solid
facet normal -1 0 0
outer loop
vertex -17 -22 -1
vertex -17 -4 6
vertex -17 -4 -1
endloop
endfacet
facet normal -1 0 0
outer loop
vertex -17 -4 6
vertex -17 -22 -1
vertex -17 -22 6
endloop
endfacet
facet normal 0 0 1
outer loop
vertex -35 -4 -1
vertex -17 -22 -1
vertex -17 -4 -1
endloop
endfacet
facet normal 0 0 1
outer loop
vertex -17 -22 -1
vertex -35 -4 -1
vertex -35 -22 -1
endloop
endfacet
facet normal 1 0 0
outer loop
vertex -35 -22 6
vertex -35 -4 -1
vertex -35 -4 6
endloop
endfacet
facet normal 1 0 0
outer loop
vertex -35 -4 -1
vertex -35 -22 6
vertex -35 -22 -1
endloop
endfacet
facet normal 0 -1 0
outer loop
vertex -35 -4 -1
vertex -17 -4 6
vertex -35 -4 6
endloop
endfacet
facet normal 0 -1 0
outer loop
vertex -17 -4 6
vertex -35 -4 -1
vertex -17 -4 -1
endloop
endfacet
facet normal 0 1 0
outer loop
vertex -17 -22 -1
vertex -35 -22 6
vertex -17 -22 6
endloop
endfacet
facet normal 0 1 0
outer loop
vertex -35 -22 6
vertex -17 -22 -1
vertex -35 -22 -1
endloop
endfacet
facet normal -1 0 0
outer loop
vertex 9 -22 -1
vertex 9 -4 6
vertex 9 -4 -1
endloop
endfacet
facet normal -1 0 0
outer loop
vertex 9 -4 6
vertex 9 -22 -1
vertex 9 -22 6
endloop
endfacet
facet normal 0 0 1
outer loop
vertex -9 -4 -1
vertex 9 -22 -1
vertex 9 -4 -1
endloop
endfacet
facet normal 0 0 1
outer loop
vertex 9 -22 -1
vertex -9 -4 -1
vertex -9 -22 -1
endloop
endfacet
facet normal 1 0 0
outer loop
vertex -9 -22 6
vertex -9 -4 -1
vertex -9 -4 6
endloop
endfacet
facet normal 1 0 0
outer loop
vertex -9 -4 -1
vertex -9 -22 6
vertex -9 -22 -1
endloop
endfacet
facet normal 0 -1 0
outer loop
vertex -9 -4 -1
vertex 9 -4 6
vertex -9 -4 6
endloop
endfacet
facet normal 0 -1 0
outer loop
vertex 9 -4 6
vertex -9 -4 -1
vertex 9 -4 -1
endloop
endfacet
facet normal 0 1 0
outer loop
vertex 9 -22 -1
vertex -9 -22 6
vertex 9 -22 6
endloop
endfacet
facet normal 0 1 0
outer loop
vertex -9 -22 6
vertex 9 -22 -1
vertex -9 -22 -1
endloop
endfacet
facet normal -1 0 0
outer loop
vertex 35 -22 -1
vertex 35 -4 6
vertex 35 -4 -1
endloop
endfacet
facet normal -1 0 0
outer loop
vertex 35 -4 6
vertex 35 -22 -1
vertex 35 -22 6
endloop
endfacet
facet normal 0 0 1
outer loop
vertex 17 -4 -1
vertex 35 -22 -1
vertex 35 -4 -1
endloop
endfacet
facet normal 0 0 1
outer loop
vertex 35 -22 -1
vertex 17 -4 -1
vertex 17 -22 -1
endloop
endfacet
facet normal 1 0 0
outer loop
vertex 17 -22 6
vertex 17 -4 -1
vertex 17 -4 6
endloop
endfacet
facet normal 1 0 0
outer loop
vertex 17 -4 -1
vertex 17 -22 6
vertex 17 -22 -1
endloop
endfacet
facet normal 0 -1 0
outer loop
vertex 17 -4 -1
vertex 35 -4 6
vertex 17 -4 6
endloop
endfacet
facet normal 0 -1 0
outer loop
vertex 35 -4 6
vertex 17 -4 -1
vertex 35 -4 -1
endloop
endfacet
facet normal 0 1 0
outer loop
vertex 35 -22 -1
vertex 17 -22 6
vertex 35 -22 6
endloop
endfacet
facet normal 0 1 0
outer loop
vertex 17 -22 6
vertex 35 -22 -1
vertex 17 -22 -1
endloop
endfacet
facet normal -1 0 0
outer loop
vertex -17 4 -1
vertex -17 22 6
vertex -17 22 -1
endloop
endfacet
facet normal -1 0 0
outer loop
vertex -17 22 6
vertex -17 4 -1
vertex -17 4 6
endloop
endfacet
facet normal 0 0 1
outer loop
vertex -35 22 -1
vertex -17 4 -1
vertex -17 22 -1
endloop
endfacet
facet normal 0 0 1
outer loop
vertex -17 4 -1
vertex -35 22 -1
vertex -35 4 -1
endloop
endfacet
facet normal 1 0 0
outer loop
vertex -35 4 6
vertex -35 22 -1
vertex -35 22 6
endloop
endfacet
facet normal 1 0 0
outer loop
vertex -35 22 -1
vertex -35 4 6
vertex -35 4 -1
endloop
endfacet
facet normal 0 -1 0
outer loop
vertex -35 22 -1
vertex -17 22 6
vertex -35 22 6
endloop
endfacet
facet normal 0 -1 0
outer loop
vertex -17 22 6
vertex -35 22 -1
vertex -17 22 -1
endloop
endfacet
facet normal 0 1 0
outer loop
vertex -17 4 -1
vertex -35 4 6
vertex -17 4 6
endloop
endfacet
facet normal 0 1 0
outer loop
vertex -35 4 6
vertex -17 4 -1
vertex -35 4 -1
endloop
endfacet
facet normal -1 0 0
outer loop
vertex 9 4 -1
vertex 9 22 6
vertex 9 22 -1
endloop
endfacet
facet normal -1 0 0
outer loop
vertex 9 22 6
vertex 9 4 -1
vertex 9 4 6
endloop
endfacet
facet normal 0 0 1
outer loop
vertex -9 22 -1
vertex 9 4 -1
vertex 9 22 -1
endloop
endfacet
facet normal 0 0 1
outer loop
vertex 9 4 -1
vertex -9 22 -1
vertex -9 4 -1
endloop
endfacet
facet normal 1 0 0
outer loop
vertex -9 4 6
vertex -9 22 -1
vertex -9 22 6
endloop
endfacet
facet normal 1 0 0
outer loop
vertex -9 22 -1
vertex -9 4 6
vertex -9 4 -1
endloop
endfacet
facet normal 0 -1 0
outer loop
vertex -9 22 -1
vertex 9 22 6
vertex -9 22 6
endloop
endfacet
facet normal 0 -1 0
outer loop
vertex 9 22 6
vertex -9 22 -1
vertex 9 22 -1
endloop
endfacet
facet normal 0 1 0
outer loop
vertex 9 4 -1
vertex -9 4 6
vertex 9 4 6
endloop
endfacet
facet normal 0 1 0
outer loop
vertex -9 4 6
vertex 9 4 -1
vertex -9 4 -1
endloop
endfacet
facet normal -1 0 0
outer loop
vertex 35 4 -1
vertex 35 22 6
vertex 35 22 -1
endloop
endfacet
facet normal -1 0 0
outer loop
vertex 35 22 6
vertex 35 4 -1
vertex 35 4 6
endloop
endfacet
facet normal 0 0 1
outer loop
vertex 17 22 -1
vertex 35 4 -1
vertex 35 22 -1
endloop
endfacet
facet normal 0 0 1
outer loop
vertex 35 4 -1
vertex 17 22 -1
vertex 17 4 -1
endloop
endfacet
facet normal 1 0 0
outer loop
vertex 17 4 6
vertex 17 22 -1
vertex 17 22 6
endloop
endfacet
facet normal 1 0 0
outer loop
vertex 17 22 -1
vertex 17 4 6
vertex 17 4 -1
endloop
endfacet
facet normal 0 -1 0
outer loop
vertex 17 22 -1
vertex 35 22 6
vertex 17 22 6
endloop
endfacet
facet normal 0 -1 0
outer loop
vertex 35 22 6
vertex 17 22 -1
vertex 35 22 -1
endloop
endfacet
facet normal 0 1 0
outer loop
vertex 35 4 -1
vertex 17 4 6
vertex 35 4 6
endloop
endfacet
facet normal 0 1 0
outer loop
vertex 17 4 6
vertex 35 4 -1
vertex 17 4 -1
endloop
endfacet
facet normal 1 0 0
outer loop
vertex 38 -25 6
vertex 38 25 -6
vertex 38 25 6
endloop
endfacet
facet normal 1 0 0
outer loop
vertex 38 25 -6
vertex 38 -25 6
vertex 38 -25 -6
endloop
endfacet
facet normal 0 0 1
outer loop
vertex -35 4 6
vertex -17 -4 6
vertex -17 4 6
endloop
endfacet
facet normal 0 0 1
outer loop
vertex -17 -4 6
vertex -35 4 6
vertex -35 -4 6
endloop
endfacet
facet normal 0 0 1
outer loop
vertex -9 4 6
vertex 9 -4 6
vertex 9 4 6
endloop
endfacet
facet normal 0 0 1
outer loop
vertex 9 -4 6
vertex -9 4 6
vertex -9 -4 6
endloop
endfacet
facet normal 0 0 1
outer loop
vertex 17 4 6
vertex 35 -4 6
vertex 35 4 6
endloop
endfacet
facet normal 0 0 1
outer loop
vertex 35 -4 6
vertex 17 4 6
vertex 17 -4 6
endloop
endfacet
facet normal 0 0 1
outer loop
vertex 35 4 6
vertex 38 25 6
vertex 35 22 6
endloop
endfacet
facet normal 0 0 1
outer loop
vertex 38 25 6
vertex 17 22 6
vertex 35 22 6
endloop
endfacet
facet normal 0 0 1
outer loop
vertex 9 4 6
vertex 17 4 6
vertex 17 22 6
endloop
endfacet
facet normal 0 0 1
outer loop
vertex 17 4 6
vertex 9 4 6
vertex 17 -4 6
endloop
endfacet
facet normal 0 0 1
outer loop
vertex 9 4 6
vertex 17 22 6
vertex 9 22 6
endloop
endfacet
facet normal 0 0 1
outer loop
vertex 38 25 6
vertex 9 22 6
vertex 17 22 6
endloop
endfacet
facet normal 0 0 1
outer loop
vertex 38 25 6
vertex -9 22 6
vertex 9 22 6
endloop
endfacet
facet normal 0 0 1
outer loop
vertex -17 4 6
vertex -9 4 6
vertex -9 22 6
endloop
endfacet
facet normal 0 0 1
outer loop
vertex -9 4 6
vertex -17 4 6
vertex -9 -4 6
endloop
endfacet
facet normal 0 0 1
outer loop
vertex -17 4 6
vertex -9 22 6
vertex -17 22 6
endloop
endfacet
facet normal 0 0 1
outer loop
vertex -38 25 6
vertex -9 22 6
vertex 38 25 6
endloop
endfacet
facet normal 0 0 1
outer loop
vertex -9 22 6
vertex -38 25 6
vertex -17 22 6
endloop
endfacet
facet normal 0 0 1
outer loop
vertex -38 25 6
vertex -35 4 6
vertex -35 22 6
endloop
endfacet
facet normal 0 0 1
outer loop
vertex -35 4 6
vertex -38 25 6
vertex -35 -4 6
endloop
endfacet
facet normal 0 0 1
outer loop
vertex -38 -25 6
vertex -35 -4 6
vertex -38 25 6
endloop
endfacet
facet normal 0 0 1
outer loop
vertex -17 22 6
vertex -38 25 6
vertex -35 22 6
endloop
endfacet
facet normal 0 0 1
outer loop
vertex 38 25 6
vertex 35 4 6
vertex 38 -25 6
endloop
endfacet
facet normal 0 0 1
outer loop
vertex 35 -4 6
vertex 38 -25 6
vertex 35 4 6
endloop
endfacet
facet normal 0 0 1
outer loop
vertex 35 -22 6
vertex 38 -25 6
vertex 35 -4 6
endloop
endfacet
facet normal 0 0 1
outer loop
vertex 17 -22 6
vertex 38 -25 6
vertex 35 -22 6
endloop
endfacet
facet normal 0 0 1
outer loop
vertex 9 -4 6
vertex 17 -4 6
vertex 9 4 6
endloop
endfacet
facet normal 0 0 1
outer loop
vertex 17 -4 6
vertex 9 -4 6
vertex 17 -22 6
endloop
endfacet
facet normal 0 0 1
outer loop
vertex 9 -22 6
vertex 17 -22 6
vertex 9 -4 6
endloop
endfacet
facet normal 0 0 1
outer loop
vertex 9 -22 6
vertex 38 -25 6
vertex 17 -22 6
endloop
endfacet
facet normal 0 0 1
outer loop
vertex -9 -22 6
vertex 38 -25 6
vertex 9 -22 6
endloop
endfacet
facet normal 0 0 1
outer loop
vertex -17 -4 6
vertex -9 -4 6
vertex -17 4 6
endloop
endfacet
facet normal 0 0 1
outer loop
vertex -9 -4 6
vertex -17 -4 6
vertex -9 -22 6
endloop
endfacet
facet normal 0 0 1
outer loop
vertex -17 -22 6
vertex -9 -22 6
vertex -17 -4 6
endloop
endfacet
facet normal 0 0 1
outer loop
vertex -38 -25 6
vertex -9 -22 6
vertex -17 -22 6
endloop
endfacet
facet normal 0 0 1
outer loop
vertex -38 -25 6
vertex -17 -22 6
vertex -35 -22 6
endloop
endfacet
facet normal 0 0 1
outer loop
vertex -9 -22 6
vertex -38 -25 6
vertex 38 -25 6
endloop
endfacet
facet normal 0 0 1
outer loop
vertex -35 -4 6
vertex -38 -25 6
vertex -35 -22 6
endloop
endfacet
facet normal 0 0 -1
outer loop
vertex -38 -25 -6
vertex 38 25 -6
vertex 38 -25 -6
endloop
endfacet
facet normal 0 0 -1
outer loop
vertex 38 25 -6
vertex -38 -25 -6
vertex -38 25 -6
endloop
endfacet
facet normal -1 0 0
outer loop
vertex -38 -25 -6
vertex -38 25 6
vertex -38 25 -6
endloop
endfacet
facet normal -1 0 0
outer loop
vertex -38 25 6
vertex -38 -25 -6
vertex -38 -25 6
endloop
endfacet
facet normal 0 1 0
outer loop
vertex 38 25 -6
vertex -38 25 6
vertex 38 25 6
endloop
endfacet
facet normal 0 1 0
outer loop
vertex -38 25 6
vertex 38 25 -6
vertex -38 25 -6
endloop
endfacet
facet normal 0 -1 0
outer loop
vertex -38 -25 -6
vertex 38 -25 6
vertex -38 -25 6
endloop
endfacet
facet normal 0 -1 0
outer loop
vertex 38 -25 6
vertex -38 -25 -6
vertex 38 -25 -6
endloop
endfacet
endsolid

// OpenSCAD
$fn = 32;

// ----------------------------------------------------------------------
// Pocket plate 76 x 50 x 12
// 2 x 3 pockets 18 mm square, 7 mm deep
// ----------------------------------------------------------------------

// --- parameters (mm) ---
thickness = 12;  // plate thickness
floor_t = 5;     // material left under each pocket
pocket = 18;     // pocket side length
pitch_x = 26;    // pocket pitch along X
pitch_y = 26;    // pocket pitch along Y
cols = 3;        // pockets per row
rows = 2;        // rows of pockets

// --- derived feature positions (mm) ---
depth = thickness - floor_t;        // = 7   pocket depth, down to the floor
span_x = (cols - 1) * pitch_x;      // = 52   distance between outer pockets
span_y = (rows - 1) * pitch_y;      // = 26   distance between outer pocket rows
origin_x = -span_x / 2;             // = -26   X of the first pocket
origin_y = -span_y / 2;             // = -13   Y of the first pocket
plate = [span_x + pocket + 6, span_y + pocket + 6, thickness];  // = [76, 50, 12]   overall size: pockets plus 3 mm of wall on each side
feature_centers = [
  [origin_x + 0 * pitch_x, origin_y + 0 * pitch_y],
  [origin_x + 1 * pitch_x, origin_y + 0 * pitch_y],
  [origin_x + 2 * pitch_x, origin_y + 0 * pitch_y],
  [origin_x + 0 * pitch_x, origin_y + 1 * pitch_y],
  [origin_x + 1 * pitch_x, origin_y + 1 * pitch_y],
  [origin_x + 2 * pitch_x, origin_y + 1 * pitch_y]
];   // pocket centres, used verbatim by the cutter loop

// plate outline, then one pocket per centre in feature_centers
difference() {
  cube(plate, center = true);
  for (centre = feature_centers)
    translate([centre[0] - pocket / 2, centre[1] - pocket / 2, plate[2] / 2 - depth])
      cube([pocket, pocket, depth + 1]);  // centred on the declared pocket centre
}
